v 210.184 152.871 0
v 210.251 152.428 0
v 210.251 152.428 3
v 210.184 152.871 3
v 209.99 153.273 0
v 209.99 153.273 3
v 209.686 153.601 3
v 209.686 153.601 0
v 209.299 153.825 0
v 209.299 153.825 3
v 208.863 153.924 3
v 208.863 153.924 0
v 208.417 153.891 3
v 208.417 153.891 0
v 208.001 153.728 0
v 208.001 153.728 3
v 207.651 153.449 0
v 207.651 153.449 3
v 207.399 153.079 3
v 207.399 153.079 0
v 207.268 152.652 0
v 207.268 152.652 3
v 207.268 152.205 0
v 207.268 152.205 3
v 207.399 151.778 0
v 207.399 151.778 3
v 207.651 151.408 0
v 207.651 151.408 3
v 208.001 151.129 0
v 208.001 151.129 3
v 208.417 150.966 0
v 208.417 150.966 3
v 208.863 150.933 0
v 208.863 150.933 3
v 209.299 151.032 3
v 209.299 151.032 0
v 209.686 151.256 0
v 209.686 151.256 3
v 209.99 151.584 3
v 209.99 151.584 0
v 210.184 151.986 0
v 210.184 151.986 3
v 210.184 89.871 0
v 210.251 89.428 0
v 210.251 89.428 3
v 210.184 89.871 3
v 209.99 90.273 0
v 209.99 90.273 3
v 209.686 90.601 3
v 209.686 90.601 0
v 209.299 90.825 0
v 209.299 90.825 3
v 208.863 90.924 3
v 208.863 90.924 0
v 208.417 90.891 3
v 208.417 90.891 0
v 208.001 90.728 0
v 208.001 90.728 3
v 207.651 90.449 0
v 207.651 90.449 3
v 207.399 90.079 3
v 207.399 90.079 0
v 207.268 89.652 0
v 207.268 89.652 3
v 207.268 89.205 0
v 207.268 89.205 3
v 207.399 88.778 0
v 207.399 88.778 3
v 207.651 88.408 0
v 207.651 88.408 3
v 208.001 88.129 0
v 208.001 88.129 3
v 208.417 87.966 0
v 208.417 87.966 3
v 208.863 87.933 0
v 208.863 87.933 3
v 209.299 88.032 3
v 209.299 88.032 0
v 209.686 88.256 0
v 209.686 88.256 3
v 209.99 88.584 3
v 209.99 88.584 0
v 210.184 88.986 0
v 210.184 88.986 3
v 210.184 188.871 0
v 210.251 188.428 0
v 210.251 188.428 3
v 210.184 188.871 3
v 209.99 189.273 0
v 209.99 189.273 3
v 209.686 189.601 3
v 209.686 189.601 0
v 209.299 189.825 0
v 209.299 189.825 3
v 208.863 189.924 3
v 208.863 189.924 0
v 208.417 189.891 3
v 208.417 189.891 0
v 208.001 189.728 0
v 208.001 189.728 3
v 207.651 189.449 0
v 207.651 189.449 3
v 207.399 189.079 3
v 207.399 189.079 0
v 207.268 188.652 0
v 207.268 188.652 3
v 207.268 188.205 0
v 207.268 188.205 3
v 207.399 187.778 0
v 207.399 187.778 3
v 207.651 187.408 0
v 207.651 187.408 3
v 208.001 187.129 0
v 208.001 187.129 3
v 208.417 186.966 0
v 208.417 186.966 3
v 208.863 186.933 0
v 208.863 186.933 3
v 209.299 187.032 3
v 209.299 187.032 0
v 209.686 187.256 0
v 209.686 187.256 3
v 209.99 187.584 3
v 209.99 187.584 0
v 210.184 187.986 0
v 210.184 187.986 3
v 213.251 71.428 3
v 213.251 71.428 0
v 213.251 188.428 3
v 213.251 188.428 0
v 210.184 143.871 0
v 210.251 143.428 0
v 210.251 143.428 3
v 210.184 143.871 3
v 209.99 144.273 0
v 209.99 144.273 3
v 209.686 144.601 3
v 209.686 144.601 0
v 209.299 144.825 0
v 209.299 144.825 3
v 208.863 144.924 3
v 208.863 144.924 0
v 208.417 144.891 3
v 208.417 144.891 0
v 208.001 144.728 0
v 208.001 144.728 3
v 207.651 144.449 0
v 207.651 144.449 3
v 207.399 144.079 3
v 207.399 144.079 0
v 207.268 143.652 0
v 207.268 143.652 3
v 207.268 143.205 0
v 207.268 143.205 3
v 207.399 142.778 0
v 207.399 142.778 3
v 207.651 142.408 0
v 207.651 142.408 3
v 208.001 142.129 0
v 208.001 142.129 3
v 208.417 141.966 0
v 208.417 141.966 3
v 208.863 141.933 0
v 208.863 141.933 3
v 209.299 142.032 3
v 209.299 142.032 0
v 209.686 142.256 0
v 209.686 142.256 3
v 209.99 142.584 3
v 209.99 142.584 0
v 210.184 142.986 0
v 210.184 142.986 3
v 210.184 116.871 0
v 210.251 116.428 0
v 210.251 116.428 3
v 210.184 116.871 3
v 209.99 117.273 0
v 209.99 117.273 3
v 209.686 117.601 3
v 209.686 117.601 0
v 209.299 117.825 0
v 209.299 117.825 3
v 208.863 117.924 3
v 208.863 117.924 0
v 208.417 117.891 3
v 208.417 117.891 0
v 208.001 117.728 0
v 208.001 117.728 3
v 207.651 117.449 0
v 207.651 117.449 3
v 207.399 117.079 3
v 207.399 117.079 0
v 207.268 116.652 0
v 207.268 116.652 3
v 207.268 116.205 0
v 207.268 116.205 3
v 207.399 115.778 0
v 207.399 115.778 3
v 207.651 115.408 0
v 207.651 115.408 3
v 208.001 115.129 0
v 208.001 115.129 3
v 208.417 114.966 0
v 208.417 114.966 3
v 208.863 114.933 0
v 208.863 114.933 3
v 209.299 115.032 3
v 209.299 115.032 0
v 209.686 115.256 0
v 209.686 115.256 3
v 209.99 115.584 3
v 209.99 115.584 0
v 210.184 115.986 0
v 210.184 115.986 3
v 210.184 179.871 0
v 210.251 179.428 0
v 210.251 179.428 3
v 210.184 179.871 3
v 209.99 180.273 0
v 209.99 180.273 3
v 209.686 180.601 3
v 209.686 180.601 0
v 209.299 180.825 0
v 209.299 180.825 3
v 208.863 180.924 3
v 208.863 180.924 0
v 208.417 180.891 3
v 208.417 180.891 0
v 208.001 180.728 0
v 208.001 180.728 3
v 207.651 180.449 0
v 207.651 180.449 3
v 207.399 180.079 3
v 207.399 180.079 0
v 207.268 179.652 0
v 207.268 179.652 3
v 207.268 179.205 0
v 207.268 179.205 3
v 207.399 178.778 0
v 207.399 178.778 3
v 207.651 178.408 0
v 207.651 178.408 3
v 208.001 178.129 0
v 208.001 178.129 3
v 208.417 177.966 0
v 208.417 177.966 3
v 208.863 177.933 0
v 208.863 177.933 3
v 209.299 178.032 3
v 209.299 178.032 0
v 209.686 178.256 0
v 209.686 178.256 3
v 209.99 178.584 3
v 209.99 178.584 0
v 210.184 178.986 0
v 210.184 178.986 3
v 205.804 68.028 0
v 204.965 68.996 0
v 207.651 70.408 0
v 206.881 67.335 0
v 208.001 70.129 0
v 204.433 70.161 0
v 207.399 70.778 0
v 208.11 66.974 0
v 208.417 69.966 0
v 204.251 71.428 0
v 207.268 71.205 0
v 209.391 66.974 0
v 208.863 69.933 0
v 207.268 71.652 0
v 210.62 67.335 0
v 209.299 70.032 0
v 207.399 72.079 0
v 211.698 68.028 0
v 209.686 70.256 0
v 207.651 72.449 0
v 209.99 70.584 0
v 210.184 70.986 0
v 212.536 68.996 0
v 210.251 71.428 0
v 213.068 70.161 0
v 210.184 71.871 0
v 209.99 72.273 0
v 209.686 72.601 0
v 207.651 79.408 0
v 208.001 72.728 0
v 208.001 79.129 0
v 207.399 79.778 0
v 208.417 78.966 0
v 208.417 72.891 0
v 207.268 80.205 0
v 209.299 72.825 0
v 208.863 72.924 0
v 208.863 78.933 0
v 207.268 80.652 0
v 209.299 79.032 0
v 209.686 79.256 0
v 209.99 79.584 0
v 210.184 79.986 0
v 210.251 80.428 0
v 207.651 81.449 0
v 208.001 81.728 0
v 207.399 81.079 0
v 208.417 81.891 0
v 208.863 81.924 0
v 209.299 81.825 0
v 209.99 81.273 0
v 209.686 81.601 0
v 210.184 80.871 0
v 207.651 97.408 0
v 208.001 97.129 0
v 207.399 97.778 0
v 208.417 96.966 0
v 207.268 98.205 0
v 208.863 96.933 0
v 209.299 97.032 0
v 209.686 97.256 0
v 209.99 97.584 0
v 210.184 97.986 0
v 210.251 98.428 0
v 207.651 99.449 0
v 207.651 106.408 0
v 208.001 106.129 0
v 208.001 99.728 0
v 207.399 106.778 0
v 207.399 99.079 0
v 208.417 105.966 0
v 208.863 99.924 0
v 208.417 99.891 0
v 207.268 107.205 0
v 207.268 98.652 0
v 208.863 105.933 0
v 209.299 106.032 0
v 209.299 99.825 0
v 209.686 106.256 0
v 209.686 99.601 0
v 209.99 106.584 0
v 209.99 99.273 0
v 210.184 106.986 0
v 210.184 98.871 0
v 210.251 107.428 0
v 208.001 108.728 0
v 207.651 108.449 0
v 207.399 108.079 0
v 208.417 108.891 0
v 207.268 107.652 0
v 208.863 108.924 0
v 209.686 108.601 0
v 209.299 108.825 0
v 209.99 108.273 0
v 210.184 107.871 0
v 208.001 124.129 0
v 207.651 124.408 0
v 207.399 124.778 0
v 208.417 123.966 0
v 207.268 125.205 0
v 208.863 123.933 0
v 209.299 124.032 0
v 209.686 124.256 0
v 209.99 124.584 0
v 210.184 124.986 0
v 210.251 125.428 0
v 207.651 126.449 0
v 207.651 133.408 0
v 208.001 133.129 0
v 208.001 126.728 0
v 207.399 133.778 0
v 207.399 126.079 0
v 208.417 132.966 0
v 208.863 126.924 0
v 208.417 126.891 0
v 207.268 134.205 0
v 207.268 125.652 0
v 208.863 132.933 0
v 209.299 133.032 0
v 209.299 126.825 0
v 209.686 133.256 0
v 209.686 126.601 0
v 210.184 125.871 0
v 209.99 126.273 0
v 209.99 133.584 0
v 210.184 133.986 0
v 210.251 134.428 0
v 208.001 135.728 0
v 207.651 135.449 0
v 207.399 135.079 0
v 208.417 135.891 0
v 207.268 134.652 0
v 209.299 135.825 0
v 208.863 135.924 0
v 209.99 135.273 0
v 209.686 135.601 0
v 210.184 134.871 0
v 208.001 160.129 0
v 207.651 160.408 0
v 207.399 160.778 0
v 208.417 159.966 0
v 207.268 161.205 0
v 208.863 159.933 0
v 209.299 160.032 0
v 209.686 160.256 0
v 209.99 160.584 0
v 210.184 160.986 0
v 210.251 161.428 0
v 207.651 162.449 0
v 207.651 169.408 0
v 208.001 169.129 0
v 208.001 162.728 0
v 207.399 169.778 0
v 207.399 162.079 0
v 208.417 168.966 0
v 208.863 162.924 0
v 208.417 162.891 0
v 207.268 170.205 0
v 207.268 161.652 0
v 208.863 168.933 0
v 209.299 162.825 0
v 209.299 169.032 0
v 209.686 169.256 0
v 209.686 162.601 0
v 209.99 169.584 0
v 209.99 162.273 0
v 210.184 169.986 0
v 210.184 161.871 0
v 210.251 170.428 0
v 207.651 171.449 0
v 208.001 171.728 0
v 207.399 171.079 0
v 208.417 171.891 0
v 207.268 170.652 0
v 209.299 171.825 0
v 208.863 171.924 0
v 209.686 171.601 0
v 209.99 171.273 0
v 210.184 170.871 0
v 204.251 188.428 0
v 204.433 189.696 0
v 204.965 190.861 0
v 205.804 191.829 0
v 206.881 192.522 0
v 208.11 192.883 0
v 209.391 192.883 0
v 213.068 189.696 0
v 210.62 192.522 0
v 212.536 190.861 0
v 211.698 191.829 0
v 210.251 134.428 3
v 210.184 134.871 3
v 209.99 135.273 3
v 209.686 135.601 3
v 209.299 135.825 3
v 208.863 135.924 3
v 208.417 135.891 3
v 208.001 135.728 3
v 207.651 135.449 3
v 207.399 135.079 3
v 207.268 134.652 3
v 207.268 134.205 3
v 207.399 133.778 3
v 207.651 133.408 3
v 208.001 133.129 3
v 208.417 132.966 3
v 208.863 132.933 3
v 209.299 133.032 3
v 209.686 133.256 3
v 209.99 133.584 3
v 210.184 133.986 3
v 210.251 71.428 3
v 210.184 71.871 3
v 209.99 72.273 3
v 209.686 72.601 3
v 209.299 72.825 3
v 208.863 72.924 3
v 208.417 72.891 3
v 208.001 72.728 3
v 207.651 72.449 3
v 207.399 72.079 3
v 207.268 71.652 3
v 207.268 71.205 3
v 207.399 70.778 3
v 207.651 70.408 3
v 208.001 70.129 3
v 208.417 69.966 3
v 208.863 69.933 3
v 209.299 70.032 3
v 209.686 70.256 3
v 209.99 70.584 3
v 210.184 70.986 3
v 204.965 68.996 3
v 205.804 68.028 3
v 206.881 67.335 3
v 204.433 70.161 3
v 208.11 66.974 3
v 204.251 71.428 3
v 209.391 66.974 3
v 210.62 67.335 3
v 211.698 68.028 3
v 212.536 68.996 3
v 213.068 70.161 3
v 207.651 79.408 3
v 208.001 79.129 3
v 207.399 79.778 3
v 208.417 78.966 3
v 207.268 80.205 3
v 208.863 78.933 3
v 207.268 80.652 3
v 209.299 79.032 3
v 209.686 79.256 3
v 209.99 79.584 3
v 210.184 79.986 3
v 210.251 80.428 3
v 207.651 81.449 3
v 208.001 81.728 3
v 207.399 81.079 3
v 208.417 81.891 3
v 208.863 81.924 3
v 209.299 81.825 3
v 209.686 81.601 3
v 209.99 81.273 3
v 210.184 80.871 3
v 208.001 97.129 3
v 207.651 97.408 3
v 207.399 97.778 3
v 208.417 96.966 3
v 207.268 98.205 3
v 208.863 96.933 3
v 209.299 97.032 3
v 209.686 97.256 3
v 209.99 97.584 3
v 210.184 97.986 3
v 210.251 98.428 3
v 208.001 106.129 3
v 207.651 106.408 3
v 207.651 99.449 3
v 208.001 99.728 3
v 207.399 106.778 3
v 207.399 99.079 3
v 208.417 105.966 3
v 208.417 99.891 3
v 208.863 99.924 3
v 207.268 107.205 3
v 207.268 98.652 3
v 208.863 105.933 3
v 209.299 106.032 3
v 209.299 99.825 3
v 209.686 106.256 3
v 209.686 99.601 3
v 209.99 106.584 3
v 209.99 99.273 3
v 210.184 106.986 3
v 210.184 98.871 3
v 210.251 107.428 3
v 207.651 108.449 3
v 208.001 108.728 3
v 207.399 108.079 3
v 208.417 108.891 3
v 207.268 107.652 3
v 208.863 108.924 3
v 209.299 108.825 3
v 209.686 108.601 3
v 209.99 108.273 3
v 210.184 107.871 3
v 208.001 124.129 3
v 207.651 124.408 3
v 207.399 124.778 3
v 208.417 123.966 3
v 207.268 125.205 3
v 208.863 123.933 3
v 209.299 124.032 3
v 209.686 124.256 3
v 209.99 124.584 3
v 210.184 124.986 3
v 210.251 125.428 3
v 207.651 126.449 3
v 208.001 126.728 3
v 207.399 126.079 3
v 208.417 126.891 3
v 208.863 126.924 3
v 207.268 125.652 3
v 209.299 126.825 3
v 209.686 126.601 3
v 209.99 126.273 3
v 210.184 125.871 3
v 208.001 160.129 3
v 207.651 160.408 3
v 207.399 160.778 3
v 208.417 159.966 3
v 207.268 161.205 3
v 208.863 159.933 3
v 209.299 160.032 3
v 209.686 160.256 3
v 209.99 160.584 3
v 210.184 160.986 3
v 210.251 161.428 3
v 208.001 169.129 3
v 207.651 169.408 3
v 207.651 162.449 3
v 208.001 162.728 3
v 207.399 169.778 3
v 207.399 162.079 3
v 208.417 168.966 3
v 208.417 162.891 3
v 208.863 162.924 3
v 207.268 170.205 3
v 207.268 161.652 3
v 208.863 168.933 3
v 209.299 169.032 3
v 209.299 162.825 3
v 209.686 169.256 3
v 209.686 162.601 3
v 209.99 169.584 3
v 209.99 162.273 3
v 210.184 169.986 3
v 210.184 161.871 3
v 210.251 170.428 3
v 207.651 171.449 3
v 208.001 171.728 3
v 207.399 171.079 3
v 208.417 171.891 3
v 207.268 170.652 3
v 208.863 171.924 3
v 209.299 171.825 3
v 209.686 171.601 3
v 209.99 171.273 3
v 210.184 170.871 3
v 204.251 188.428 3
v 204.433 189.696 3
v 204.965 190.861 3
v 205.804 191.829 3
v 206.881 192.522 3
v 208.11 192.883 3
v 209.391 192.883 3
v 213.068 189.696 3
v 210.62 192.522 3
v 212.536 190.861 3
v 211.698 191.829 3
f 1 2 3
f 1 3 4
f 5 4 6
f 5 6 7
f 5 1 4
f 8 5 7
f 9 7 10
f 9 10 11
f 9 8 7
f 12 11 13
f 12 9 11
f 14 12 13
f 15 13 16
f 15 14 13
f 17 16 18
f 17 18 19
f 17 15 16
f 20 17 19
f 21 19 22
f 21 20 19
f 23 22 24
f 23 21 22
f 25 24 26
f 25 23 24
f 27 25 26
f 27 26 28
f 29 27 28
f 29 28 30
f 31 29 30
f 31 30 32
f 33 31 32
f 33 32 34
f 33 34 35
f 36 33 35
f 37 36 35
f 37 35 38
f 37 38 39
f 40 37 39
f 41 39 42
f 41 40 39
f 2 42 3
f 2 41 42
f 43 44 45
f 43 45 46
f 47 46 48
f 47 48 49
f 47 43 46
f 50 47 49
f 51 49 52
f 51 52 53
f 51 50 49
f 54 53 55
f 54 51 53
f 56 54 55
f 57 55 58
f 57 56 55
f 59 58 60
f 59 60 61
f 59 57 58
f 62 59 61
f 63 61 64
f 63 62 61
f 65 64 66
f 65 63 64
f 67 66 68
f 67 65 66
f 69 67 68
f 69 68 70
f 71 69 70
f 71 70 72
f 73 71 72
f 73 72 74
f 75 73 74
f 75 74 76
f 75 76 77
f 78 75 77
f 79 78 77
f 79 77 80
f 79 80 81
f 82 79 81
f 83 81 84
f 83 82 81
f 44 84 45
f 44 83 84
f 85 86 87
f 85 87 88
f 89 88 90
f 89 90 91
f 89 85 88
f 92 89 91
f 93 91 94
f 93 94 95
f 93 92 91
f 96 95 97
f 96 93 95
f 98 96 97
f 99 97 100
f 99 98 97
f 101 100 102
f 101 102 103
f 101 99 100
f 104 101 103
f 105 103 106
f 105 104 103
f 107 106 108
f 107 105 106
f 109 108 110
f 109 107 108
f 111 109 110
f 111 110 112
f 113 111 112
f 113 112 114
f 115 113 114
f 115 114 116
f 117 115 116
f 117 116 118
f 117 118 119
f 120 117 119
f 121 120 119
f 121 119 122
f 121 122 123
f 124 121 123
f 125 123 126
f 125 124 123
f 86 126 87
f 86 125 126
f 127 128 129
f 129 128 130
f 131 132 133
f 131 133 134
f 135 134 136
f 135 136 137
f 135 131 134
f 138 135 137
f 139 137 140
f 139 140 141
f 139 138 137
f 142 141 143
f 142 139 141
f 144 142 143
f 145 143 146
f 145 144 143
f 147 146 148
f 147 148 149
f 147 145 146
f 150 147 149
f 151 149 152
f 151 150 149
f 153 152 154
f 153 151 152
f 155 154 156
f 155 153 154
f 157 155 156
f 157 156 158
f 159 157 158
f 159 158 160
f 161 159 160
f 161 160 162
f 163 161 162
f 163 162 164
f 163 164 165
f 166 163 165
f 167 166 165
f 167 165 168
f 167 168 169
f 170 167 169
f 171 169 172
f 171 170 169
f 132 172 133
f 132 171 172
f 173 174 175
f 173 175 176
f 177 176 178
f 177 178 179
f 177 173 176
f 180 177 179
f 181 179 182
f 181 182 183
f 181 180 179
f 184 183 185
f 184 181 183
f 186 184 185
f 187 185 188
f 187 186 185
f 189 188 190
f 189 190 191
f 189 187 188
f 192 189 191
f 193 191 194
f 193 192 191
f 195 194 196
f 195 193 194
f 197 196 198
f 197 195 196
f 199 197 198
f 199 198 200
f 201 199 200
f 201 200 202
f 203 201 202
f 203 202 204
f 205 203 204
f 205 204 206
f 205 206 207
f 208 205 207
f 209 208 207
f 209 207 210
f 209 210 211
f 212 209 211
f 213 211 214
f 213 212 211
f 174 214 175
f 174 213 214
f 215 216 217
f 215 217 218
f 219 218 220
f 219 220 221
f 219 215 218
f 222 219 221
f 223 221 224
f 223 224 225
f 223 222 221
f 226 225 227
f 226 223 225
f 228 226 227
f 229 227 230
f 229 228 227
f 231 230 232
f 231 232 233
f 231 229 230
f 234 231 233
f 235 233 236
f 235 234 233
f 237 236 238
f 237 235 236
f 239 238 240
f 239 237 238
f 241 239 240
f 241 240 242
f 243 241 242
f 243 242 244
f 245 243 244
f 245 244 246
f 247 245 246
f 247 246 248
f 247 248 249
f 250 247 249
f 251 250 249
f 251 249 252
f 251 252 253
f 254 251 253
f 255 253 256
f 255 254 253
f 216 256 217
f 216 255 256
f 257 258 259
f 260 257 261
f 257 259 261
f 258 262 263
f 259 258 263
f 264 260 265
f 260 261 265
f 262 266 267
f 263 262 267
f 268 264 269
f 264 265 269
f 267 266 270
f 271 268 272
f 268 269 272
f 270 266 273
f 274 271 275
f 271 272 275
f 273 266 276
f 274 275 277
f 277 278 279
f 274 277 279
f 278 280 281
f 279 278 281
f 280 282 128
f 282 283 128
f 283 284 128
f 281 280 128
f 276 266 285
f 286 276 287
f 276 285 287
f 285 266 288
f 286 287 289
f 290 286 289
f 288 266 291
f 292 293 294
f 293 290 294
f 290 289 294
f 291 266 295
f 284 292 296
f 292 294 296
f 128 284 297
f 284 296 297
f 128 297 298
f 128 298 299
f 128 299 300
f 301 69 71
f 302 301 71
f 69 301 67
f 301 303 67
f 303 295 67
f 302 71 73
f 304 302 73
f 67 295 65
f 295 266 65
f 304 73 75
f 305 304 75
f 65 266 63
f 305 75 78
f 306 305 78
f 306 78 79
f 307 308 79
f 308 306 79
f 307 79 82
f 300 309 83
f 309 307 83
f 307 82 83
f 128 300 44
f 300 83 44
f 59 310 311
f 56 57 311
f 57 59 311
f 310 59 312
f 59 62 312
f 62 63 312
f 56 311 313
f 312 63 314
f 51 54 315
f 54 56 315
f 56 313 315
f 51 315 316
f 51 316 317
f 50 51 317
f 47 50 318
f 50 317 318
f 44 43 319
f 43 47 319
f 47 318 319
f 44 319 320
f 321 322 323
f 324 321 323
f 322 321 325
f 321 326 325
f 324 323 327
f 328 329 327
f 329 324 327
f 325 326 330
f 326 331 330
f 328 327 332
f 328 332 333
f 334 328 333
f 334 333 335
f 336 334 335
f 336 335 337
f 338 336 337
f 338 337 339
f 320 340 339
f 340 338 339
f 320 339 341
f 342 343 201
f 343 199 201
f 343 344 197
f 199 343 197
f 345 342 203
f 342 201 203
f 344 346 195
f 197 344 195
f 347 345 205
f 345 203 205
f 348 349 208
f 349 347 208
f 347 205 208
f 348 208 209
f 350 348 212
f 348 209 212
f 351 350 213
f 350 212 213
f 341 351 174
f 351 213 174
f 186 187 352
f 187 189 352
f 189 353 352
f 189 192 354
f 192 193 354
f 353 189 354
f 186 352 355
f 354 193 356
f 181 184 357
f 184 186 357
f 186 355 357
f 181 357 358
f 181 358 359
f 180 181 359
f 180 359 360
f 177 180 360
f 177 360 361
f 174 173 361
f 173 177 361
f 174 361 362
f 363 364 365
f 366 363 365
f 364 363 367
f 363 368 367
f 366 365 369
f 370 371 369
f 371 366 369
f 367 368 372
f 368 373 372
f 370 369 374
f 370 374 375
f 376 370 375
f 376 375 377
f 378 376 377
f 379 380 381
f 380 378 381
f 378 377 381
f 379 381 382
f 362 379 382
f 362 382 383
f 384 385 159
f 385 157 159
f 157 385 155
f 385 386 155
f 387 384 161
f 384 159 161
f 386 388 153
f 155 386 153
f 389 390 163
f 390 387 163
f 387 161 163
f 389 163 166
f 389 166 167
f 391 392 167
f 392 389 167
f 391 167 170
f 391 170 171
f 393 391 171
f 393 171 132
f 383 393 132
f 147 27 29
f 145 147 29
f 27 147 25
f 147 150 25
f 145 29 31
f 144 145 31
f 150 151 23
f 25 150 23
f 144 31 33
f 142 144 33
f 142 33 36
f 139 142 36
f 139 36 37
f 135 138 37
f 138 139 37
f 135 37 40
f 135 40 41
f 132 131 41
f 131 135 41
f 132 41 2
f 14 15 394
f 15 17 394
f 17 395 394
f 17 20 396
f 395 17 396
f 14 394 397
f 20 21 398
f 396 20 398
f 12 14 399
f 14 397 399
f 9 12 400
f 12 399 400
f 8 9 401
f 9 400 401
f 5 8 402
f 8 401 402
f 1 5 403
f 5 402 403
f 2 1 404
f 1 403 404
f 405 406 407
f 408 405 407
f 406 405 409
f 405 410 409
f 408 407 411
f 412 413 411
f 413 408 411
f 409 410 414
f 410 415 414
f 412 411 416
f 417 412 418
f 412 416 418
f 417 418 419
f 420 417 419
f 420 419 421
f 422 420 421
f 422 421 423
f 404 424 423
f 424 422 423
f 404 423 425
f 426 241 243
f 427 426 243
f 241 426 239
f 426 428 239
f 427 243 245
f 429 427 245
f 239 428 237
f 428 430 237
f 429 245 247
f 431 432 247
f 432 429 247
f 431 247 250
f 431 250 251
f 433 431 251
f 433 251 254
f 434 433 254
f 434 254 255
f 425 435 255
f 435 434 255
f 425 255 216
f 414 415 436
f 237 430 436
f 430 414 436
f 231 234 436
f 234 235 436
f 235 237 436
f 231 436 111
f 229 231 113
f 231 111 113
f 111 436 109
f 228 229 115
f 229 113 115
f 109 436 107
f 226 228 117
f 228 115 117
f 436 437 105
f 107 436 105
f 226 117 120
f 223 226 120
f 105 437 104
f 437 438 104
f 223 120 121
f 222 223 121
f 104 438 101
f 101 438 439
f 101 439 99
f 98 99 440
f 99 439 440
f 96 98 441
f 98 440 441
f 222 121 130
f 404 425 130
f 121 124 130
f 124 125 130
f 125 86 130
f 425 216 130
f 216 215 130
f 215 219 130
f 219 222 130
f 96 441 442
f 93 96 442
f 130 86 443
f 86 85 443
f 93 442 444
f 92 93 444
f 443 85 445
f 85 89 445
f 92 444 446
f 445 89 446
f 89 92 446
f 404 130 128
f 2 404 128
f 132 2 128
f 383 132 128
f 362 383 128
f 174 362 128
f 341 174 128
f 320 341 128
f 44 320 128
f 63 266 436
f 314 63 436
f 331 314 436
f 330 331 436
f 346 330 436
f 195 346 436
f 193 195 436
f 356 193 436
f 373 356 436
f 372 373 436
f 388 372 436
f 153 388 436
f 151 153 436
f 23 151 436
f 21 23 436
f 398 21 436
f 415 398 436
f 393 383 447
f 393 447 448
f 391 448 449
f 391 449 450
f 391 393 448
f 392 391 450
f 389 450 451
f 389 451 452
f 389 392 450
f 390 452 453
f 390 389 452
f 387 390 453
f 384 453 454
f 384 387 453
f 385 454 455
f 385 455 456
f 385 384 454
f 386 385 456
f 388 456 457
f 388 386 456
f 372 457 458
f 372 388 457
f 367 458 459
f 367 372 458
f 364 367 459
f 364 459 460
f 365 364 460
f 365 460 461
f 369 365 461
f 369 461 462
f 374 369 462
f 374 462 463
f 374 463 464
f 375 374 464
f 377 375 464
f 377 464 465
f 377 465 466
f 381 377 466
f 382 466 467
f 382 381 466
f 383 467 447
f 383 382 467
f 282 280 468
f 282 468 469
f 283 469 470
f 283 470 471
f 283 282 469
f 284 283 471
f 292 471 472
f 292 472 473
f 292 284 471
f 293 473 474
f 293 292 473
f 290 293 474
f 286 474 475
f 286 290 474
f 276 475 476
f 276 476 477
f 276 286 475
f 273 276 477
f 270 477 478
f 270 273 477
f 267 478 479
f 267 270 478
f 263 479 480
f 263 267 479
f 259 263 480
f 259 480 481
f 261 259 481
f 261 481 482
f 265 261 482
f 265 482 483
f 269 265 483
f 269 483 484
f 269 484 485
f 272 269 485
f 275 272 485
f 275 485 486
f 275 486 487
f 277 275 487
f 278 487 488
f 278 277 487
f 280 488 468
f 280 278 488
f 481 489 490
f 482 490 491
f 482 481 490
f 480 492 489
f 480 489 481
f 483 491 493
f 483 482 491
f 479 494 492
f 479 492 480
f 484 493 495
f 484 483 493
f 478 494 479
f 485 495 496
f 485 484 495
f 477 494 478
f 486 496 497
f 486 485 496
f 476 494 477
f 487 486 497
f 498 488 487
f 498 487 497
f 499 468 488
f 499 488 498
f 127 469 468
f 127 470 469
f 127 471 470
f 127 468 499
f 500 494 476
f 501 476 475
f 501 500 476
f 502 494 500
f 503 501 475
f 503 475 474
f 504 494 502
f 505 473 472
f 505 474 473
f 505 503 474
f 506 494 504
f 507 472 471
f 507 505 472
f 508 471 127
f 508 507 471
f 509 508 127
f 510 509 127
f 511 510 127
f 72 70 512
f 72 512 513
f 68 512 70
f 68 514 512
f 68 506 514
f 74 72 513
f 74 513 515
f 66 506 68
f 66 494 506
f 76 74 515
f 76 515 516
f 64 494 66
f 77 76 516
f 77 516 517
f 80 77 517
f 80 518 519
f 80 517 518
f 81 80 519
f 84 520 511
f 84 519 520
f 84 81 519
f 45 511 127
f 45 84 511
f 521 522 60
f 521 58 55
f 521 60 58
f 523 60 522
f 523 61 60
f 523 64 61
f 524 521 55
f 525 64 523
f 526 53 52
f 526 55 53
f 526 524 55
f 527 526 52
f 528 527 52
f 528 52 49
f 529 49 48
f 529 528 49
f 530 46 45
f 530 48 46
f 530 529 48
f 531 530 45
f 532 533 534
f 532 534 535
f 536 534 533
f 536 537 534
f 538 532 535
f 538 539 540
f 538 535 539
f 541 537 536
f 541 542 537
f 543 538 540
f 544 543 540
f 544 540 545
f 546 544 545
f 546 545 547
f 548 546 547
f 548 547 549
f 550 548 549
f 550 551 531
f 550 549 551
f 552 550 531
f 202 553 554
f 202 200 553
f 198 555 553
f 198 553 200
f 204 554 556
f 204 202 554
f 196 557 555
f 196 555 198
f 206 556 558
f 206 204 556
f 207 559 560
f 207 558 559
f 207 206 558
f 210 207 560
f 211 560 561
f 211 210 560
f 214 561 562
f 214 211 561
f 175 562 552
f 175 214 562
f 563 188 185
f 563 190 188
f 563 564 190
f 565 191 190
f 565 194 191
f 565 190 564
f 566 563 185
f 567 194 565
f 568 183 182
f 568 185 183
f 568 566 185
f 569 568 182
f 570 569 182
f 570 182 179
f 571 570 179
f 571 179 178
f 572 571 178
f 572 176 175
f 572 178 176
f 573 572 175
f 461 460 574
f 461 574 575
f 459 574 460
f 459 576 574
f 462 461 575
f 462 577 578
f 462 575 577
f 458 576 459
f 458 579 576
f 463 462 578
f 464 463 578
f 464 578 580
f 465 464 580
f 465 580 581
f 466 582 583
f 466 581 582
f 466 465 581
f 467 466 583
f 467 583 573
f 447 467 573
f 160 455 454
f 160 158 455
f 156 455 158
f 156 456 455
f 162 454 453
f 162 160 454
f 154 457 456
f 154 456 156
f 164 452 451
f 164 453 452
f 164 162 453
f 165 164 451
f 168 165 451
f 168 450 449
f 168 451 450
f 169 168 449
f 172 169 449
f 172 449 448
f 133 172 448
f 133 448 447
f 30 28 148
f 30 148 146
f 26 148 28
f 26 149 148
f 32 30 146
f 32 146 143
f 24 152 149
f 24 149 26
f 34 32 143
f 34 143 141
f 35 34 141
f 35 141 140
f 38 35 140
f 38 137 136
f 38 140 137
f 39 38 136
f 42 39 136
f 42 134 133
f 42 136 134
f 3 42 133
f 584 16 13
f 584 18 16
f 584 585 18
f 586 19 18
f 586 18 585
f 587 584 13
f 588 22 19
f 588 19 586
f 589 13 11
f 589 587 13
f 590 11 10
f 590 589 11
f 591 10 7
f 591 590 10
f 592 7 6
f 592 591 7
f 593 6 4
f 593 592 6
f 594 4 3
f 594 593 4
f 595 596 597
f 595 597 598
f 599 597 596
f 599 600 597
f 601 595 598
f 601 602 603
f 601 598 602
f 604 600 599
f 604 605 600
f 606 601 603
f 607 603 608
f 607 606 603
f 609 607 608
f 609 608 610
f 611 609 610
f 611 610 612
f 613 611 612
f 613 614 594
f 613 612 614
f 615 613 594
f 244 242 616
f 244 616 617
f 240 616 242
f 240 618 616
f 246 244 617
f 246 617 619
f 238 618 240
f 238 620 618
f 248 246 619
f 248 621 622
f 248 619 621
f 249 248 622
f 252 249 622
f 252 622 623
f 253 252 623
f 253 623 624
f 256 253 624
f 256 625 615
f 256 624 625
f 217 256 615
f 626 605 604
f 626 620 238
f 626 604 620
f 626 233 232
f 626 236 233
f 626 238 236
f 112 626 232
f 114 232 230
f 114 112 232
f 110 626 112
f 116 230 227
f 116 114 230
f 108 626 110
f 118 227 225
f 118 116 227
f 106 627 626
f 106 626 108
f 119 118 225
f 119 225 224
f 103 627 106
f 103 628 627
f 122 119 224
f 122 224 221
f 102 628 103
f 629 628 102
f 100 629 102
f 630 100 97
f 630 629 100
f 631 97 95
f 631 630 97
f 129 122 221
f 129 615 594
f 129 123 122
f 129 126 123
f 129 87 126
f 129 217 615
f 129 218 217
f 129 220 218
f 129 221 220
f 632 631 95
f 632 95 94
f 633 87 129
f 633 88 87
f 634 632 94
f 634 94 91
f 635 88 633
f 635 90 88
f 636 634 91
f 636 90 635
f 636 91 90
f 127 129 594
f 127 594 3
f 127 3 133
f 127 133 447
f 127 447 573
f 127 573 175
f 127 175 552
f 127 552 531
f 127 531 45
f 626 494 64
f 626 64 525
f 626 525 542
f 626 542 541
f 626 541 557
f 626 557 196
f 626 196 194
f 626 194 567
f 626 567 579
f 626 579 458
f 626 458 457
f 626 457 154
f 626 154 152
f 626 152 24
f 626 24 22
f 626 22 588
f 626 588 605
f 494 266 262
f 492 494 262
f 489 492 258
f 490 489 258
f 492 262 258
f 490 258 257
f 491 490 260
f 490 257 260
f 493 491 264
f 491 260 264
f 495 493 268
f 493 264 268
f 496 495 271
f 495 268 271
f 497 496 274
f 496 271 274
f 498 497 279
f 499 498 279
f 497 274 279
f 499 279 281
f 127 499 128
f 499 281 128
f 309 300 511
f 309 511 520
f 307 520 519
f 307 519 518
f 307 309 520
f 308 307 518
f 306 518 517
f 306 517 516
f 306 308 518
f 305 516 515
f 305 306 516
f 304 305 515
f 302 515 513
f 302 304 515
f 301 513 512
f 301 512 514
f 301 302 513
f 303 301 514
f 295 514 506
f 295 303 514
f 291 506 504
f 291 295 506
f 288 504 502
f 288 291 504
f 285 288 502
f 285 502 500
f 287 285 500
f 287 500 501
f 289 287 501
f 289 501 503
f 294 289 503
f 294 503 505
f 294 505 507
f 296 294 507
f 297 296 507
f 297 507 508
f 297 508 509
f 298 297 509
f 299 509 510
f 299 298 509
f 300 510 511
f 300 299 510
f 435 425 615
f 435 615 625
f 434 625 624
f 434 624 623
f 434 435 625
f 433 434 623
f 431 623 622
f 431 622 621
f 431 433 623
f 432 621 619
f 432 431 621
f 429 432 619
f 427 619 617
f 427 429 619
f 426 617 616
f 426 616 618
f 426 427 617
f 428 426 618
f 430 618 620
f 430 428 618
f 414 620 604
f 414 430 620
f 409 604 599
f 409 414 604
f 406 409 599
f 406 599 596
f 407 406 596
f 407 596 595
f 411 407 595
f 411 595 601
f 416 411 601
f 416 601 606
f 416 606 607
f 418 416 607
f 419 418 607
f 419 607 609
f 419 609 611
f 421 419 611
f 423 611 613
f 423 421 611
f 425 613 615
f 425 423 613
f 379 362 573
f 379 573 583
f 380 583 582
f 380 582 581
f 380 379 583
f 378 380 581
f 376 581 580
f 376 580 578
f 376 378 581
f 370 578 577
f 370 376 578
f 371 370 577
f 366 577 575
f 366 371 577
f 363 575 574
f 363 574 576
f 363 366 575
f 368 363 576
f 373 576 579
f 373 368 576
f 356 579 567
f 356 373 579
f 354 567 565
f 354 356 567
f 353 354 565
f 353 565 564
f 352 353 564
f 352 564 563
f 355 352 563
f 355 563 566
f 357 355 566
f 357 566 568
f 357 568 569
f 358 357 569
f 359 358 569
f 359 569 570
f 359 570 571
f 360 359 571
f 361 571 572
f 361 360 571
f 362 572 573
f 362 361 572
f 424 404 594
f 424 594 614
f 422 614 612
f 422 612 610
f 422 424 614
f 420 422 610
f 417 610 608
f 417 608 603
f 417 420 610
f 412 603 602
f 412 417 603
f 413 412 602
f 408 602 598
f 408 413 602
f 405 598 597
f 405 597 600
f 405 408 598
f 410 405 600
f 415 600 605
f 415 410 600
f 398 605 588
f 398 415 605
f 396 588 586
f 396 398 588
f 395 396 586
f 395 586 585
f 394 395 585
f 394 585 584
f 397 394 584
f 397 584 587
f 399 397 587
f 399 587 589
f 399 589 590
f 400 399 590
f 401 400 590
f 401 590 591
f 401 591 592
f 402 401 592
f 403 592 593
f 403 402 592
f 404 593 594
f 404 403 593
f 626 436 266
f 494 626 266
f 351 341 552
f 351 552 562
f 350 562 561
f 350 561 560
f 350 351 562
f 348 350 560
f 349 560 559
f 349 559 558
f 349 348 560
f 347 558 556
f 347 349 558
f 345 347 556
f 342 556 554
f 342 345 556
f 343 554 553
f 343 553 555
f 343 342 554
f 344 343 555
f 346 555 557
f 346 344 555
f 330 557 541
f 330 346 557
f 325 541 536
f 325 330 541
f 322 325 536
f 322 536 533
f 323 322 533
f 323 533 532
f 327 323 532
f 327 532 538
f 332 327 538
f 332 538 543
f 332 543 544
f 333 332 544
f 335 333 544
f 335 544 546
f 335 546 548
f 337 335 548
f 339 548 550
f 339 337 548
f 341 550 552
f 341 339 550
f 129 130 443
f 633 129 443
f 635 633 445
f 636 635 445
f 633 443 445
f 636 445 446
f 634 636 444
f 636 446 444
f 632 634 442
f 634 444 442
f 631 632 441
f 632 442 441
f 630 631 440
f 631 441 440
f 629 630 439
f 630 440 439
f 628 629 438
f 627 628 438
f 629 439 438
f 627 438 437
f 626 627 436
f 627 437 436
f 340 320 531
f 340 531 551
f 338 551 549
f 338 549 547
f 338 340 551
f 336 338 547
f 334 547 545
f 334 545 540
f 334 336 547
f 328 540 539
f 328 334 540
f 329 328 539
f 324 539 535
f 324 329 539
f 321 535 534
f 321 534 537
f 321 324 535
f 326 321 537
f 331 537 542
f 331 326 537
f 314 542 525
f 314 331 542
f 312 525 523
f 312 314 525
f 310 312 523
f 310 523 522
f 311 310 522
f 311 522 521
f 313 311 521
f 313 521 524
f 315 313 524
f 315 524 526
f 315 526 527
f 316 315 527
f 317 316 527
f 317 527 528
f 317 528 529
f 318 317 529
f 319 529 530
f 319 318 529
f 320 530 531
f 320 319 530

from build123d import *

# Parameters (mm, degrees)
MODEL_R                 = 1.5
SALIENTE_EXTRUIR1_DEPTH = 3


with BuildPart() as part:
    # Model → Saliente-Extruir1 (new body)
    with BuildSketch(Plane.XY):
        with BuildLine():
            Line((213.25077615, 71.428489513), (213.25077615, 188.428489513))
            ThreePointArc((213.25077615, 188.428489513), (208.75077615, 192.928489513), (204.25077615, 188.428489513))
            Line((204.25077615, 188.428489513), (204.25077615, 71.428489513))
            ThreePointArc((204.25077615, 71.428489513), (208.75077615, 66.928489513), (213.25077615, 71.428489513))
        make_face()
        with Locations((208.75077615, 179.428489513)):
            Circle(MODEL_R, mode=Mode.SUBTRACT)
        with Locations((208.75077615, 188.428489513)):
            Circle(MODEL_R, mode=Mode.SUBTRACT)
        with Locations((208.75077615, 152.428489513)):
            Circle(MODEL_R, mode=Mode.SUBTRACT)
        with Locations((208.75077615, 161.428489513)):
            Circle(MODEL_R, mode=Mode.SUBTRACT)
        with Locations((208.75077615, 170.428489513)):
            Circle(MODEL_R, mode=Mode.SUBTRACT)
        with Locations((208.75077615, 143.428489513)):
            Circle(MODEL_R, mode=Mode.SUBTRACT)
        with Locations((208.75077615, 116.428489513)):
            Circle(MODEL_R, mode=Mode.SUBTRACT)
        with Locations((208.75077615, 125.428489513)):
            Circle(MODEL_R, mode=Mode.SUBTRACT)
        with Locations((208.75077615, 134.428489513)):
            Circle(MODEL_R, mode=Mode.SUBTRACT)
        with Locations((208.75077615, 71.428489513)):
            Circle(MODEL_R, mode=Mode.SUBTRACT)
        with Locations((208.75077615, 80.428489513)):
            Circle(MODEL_R, mode=Mode.SUBTRACT)
        with Locations((208.75077615, 89.428489513)):
            Circle(MODEL_R, mode=Mode.SUBTRACT)
        with Locations((208.75077615, 98.428489513)):
            Circle(MODEL_R, mode=Mode.SUBTRACT)
        with Locations((208.75077615, 107.428489513)):
            Circle(MODEL_R, mode=Mode.SUBTRACT)
    extrude(amount=SALIENTE_EXTRUIR1_DEPTH)


solid = part.part
